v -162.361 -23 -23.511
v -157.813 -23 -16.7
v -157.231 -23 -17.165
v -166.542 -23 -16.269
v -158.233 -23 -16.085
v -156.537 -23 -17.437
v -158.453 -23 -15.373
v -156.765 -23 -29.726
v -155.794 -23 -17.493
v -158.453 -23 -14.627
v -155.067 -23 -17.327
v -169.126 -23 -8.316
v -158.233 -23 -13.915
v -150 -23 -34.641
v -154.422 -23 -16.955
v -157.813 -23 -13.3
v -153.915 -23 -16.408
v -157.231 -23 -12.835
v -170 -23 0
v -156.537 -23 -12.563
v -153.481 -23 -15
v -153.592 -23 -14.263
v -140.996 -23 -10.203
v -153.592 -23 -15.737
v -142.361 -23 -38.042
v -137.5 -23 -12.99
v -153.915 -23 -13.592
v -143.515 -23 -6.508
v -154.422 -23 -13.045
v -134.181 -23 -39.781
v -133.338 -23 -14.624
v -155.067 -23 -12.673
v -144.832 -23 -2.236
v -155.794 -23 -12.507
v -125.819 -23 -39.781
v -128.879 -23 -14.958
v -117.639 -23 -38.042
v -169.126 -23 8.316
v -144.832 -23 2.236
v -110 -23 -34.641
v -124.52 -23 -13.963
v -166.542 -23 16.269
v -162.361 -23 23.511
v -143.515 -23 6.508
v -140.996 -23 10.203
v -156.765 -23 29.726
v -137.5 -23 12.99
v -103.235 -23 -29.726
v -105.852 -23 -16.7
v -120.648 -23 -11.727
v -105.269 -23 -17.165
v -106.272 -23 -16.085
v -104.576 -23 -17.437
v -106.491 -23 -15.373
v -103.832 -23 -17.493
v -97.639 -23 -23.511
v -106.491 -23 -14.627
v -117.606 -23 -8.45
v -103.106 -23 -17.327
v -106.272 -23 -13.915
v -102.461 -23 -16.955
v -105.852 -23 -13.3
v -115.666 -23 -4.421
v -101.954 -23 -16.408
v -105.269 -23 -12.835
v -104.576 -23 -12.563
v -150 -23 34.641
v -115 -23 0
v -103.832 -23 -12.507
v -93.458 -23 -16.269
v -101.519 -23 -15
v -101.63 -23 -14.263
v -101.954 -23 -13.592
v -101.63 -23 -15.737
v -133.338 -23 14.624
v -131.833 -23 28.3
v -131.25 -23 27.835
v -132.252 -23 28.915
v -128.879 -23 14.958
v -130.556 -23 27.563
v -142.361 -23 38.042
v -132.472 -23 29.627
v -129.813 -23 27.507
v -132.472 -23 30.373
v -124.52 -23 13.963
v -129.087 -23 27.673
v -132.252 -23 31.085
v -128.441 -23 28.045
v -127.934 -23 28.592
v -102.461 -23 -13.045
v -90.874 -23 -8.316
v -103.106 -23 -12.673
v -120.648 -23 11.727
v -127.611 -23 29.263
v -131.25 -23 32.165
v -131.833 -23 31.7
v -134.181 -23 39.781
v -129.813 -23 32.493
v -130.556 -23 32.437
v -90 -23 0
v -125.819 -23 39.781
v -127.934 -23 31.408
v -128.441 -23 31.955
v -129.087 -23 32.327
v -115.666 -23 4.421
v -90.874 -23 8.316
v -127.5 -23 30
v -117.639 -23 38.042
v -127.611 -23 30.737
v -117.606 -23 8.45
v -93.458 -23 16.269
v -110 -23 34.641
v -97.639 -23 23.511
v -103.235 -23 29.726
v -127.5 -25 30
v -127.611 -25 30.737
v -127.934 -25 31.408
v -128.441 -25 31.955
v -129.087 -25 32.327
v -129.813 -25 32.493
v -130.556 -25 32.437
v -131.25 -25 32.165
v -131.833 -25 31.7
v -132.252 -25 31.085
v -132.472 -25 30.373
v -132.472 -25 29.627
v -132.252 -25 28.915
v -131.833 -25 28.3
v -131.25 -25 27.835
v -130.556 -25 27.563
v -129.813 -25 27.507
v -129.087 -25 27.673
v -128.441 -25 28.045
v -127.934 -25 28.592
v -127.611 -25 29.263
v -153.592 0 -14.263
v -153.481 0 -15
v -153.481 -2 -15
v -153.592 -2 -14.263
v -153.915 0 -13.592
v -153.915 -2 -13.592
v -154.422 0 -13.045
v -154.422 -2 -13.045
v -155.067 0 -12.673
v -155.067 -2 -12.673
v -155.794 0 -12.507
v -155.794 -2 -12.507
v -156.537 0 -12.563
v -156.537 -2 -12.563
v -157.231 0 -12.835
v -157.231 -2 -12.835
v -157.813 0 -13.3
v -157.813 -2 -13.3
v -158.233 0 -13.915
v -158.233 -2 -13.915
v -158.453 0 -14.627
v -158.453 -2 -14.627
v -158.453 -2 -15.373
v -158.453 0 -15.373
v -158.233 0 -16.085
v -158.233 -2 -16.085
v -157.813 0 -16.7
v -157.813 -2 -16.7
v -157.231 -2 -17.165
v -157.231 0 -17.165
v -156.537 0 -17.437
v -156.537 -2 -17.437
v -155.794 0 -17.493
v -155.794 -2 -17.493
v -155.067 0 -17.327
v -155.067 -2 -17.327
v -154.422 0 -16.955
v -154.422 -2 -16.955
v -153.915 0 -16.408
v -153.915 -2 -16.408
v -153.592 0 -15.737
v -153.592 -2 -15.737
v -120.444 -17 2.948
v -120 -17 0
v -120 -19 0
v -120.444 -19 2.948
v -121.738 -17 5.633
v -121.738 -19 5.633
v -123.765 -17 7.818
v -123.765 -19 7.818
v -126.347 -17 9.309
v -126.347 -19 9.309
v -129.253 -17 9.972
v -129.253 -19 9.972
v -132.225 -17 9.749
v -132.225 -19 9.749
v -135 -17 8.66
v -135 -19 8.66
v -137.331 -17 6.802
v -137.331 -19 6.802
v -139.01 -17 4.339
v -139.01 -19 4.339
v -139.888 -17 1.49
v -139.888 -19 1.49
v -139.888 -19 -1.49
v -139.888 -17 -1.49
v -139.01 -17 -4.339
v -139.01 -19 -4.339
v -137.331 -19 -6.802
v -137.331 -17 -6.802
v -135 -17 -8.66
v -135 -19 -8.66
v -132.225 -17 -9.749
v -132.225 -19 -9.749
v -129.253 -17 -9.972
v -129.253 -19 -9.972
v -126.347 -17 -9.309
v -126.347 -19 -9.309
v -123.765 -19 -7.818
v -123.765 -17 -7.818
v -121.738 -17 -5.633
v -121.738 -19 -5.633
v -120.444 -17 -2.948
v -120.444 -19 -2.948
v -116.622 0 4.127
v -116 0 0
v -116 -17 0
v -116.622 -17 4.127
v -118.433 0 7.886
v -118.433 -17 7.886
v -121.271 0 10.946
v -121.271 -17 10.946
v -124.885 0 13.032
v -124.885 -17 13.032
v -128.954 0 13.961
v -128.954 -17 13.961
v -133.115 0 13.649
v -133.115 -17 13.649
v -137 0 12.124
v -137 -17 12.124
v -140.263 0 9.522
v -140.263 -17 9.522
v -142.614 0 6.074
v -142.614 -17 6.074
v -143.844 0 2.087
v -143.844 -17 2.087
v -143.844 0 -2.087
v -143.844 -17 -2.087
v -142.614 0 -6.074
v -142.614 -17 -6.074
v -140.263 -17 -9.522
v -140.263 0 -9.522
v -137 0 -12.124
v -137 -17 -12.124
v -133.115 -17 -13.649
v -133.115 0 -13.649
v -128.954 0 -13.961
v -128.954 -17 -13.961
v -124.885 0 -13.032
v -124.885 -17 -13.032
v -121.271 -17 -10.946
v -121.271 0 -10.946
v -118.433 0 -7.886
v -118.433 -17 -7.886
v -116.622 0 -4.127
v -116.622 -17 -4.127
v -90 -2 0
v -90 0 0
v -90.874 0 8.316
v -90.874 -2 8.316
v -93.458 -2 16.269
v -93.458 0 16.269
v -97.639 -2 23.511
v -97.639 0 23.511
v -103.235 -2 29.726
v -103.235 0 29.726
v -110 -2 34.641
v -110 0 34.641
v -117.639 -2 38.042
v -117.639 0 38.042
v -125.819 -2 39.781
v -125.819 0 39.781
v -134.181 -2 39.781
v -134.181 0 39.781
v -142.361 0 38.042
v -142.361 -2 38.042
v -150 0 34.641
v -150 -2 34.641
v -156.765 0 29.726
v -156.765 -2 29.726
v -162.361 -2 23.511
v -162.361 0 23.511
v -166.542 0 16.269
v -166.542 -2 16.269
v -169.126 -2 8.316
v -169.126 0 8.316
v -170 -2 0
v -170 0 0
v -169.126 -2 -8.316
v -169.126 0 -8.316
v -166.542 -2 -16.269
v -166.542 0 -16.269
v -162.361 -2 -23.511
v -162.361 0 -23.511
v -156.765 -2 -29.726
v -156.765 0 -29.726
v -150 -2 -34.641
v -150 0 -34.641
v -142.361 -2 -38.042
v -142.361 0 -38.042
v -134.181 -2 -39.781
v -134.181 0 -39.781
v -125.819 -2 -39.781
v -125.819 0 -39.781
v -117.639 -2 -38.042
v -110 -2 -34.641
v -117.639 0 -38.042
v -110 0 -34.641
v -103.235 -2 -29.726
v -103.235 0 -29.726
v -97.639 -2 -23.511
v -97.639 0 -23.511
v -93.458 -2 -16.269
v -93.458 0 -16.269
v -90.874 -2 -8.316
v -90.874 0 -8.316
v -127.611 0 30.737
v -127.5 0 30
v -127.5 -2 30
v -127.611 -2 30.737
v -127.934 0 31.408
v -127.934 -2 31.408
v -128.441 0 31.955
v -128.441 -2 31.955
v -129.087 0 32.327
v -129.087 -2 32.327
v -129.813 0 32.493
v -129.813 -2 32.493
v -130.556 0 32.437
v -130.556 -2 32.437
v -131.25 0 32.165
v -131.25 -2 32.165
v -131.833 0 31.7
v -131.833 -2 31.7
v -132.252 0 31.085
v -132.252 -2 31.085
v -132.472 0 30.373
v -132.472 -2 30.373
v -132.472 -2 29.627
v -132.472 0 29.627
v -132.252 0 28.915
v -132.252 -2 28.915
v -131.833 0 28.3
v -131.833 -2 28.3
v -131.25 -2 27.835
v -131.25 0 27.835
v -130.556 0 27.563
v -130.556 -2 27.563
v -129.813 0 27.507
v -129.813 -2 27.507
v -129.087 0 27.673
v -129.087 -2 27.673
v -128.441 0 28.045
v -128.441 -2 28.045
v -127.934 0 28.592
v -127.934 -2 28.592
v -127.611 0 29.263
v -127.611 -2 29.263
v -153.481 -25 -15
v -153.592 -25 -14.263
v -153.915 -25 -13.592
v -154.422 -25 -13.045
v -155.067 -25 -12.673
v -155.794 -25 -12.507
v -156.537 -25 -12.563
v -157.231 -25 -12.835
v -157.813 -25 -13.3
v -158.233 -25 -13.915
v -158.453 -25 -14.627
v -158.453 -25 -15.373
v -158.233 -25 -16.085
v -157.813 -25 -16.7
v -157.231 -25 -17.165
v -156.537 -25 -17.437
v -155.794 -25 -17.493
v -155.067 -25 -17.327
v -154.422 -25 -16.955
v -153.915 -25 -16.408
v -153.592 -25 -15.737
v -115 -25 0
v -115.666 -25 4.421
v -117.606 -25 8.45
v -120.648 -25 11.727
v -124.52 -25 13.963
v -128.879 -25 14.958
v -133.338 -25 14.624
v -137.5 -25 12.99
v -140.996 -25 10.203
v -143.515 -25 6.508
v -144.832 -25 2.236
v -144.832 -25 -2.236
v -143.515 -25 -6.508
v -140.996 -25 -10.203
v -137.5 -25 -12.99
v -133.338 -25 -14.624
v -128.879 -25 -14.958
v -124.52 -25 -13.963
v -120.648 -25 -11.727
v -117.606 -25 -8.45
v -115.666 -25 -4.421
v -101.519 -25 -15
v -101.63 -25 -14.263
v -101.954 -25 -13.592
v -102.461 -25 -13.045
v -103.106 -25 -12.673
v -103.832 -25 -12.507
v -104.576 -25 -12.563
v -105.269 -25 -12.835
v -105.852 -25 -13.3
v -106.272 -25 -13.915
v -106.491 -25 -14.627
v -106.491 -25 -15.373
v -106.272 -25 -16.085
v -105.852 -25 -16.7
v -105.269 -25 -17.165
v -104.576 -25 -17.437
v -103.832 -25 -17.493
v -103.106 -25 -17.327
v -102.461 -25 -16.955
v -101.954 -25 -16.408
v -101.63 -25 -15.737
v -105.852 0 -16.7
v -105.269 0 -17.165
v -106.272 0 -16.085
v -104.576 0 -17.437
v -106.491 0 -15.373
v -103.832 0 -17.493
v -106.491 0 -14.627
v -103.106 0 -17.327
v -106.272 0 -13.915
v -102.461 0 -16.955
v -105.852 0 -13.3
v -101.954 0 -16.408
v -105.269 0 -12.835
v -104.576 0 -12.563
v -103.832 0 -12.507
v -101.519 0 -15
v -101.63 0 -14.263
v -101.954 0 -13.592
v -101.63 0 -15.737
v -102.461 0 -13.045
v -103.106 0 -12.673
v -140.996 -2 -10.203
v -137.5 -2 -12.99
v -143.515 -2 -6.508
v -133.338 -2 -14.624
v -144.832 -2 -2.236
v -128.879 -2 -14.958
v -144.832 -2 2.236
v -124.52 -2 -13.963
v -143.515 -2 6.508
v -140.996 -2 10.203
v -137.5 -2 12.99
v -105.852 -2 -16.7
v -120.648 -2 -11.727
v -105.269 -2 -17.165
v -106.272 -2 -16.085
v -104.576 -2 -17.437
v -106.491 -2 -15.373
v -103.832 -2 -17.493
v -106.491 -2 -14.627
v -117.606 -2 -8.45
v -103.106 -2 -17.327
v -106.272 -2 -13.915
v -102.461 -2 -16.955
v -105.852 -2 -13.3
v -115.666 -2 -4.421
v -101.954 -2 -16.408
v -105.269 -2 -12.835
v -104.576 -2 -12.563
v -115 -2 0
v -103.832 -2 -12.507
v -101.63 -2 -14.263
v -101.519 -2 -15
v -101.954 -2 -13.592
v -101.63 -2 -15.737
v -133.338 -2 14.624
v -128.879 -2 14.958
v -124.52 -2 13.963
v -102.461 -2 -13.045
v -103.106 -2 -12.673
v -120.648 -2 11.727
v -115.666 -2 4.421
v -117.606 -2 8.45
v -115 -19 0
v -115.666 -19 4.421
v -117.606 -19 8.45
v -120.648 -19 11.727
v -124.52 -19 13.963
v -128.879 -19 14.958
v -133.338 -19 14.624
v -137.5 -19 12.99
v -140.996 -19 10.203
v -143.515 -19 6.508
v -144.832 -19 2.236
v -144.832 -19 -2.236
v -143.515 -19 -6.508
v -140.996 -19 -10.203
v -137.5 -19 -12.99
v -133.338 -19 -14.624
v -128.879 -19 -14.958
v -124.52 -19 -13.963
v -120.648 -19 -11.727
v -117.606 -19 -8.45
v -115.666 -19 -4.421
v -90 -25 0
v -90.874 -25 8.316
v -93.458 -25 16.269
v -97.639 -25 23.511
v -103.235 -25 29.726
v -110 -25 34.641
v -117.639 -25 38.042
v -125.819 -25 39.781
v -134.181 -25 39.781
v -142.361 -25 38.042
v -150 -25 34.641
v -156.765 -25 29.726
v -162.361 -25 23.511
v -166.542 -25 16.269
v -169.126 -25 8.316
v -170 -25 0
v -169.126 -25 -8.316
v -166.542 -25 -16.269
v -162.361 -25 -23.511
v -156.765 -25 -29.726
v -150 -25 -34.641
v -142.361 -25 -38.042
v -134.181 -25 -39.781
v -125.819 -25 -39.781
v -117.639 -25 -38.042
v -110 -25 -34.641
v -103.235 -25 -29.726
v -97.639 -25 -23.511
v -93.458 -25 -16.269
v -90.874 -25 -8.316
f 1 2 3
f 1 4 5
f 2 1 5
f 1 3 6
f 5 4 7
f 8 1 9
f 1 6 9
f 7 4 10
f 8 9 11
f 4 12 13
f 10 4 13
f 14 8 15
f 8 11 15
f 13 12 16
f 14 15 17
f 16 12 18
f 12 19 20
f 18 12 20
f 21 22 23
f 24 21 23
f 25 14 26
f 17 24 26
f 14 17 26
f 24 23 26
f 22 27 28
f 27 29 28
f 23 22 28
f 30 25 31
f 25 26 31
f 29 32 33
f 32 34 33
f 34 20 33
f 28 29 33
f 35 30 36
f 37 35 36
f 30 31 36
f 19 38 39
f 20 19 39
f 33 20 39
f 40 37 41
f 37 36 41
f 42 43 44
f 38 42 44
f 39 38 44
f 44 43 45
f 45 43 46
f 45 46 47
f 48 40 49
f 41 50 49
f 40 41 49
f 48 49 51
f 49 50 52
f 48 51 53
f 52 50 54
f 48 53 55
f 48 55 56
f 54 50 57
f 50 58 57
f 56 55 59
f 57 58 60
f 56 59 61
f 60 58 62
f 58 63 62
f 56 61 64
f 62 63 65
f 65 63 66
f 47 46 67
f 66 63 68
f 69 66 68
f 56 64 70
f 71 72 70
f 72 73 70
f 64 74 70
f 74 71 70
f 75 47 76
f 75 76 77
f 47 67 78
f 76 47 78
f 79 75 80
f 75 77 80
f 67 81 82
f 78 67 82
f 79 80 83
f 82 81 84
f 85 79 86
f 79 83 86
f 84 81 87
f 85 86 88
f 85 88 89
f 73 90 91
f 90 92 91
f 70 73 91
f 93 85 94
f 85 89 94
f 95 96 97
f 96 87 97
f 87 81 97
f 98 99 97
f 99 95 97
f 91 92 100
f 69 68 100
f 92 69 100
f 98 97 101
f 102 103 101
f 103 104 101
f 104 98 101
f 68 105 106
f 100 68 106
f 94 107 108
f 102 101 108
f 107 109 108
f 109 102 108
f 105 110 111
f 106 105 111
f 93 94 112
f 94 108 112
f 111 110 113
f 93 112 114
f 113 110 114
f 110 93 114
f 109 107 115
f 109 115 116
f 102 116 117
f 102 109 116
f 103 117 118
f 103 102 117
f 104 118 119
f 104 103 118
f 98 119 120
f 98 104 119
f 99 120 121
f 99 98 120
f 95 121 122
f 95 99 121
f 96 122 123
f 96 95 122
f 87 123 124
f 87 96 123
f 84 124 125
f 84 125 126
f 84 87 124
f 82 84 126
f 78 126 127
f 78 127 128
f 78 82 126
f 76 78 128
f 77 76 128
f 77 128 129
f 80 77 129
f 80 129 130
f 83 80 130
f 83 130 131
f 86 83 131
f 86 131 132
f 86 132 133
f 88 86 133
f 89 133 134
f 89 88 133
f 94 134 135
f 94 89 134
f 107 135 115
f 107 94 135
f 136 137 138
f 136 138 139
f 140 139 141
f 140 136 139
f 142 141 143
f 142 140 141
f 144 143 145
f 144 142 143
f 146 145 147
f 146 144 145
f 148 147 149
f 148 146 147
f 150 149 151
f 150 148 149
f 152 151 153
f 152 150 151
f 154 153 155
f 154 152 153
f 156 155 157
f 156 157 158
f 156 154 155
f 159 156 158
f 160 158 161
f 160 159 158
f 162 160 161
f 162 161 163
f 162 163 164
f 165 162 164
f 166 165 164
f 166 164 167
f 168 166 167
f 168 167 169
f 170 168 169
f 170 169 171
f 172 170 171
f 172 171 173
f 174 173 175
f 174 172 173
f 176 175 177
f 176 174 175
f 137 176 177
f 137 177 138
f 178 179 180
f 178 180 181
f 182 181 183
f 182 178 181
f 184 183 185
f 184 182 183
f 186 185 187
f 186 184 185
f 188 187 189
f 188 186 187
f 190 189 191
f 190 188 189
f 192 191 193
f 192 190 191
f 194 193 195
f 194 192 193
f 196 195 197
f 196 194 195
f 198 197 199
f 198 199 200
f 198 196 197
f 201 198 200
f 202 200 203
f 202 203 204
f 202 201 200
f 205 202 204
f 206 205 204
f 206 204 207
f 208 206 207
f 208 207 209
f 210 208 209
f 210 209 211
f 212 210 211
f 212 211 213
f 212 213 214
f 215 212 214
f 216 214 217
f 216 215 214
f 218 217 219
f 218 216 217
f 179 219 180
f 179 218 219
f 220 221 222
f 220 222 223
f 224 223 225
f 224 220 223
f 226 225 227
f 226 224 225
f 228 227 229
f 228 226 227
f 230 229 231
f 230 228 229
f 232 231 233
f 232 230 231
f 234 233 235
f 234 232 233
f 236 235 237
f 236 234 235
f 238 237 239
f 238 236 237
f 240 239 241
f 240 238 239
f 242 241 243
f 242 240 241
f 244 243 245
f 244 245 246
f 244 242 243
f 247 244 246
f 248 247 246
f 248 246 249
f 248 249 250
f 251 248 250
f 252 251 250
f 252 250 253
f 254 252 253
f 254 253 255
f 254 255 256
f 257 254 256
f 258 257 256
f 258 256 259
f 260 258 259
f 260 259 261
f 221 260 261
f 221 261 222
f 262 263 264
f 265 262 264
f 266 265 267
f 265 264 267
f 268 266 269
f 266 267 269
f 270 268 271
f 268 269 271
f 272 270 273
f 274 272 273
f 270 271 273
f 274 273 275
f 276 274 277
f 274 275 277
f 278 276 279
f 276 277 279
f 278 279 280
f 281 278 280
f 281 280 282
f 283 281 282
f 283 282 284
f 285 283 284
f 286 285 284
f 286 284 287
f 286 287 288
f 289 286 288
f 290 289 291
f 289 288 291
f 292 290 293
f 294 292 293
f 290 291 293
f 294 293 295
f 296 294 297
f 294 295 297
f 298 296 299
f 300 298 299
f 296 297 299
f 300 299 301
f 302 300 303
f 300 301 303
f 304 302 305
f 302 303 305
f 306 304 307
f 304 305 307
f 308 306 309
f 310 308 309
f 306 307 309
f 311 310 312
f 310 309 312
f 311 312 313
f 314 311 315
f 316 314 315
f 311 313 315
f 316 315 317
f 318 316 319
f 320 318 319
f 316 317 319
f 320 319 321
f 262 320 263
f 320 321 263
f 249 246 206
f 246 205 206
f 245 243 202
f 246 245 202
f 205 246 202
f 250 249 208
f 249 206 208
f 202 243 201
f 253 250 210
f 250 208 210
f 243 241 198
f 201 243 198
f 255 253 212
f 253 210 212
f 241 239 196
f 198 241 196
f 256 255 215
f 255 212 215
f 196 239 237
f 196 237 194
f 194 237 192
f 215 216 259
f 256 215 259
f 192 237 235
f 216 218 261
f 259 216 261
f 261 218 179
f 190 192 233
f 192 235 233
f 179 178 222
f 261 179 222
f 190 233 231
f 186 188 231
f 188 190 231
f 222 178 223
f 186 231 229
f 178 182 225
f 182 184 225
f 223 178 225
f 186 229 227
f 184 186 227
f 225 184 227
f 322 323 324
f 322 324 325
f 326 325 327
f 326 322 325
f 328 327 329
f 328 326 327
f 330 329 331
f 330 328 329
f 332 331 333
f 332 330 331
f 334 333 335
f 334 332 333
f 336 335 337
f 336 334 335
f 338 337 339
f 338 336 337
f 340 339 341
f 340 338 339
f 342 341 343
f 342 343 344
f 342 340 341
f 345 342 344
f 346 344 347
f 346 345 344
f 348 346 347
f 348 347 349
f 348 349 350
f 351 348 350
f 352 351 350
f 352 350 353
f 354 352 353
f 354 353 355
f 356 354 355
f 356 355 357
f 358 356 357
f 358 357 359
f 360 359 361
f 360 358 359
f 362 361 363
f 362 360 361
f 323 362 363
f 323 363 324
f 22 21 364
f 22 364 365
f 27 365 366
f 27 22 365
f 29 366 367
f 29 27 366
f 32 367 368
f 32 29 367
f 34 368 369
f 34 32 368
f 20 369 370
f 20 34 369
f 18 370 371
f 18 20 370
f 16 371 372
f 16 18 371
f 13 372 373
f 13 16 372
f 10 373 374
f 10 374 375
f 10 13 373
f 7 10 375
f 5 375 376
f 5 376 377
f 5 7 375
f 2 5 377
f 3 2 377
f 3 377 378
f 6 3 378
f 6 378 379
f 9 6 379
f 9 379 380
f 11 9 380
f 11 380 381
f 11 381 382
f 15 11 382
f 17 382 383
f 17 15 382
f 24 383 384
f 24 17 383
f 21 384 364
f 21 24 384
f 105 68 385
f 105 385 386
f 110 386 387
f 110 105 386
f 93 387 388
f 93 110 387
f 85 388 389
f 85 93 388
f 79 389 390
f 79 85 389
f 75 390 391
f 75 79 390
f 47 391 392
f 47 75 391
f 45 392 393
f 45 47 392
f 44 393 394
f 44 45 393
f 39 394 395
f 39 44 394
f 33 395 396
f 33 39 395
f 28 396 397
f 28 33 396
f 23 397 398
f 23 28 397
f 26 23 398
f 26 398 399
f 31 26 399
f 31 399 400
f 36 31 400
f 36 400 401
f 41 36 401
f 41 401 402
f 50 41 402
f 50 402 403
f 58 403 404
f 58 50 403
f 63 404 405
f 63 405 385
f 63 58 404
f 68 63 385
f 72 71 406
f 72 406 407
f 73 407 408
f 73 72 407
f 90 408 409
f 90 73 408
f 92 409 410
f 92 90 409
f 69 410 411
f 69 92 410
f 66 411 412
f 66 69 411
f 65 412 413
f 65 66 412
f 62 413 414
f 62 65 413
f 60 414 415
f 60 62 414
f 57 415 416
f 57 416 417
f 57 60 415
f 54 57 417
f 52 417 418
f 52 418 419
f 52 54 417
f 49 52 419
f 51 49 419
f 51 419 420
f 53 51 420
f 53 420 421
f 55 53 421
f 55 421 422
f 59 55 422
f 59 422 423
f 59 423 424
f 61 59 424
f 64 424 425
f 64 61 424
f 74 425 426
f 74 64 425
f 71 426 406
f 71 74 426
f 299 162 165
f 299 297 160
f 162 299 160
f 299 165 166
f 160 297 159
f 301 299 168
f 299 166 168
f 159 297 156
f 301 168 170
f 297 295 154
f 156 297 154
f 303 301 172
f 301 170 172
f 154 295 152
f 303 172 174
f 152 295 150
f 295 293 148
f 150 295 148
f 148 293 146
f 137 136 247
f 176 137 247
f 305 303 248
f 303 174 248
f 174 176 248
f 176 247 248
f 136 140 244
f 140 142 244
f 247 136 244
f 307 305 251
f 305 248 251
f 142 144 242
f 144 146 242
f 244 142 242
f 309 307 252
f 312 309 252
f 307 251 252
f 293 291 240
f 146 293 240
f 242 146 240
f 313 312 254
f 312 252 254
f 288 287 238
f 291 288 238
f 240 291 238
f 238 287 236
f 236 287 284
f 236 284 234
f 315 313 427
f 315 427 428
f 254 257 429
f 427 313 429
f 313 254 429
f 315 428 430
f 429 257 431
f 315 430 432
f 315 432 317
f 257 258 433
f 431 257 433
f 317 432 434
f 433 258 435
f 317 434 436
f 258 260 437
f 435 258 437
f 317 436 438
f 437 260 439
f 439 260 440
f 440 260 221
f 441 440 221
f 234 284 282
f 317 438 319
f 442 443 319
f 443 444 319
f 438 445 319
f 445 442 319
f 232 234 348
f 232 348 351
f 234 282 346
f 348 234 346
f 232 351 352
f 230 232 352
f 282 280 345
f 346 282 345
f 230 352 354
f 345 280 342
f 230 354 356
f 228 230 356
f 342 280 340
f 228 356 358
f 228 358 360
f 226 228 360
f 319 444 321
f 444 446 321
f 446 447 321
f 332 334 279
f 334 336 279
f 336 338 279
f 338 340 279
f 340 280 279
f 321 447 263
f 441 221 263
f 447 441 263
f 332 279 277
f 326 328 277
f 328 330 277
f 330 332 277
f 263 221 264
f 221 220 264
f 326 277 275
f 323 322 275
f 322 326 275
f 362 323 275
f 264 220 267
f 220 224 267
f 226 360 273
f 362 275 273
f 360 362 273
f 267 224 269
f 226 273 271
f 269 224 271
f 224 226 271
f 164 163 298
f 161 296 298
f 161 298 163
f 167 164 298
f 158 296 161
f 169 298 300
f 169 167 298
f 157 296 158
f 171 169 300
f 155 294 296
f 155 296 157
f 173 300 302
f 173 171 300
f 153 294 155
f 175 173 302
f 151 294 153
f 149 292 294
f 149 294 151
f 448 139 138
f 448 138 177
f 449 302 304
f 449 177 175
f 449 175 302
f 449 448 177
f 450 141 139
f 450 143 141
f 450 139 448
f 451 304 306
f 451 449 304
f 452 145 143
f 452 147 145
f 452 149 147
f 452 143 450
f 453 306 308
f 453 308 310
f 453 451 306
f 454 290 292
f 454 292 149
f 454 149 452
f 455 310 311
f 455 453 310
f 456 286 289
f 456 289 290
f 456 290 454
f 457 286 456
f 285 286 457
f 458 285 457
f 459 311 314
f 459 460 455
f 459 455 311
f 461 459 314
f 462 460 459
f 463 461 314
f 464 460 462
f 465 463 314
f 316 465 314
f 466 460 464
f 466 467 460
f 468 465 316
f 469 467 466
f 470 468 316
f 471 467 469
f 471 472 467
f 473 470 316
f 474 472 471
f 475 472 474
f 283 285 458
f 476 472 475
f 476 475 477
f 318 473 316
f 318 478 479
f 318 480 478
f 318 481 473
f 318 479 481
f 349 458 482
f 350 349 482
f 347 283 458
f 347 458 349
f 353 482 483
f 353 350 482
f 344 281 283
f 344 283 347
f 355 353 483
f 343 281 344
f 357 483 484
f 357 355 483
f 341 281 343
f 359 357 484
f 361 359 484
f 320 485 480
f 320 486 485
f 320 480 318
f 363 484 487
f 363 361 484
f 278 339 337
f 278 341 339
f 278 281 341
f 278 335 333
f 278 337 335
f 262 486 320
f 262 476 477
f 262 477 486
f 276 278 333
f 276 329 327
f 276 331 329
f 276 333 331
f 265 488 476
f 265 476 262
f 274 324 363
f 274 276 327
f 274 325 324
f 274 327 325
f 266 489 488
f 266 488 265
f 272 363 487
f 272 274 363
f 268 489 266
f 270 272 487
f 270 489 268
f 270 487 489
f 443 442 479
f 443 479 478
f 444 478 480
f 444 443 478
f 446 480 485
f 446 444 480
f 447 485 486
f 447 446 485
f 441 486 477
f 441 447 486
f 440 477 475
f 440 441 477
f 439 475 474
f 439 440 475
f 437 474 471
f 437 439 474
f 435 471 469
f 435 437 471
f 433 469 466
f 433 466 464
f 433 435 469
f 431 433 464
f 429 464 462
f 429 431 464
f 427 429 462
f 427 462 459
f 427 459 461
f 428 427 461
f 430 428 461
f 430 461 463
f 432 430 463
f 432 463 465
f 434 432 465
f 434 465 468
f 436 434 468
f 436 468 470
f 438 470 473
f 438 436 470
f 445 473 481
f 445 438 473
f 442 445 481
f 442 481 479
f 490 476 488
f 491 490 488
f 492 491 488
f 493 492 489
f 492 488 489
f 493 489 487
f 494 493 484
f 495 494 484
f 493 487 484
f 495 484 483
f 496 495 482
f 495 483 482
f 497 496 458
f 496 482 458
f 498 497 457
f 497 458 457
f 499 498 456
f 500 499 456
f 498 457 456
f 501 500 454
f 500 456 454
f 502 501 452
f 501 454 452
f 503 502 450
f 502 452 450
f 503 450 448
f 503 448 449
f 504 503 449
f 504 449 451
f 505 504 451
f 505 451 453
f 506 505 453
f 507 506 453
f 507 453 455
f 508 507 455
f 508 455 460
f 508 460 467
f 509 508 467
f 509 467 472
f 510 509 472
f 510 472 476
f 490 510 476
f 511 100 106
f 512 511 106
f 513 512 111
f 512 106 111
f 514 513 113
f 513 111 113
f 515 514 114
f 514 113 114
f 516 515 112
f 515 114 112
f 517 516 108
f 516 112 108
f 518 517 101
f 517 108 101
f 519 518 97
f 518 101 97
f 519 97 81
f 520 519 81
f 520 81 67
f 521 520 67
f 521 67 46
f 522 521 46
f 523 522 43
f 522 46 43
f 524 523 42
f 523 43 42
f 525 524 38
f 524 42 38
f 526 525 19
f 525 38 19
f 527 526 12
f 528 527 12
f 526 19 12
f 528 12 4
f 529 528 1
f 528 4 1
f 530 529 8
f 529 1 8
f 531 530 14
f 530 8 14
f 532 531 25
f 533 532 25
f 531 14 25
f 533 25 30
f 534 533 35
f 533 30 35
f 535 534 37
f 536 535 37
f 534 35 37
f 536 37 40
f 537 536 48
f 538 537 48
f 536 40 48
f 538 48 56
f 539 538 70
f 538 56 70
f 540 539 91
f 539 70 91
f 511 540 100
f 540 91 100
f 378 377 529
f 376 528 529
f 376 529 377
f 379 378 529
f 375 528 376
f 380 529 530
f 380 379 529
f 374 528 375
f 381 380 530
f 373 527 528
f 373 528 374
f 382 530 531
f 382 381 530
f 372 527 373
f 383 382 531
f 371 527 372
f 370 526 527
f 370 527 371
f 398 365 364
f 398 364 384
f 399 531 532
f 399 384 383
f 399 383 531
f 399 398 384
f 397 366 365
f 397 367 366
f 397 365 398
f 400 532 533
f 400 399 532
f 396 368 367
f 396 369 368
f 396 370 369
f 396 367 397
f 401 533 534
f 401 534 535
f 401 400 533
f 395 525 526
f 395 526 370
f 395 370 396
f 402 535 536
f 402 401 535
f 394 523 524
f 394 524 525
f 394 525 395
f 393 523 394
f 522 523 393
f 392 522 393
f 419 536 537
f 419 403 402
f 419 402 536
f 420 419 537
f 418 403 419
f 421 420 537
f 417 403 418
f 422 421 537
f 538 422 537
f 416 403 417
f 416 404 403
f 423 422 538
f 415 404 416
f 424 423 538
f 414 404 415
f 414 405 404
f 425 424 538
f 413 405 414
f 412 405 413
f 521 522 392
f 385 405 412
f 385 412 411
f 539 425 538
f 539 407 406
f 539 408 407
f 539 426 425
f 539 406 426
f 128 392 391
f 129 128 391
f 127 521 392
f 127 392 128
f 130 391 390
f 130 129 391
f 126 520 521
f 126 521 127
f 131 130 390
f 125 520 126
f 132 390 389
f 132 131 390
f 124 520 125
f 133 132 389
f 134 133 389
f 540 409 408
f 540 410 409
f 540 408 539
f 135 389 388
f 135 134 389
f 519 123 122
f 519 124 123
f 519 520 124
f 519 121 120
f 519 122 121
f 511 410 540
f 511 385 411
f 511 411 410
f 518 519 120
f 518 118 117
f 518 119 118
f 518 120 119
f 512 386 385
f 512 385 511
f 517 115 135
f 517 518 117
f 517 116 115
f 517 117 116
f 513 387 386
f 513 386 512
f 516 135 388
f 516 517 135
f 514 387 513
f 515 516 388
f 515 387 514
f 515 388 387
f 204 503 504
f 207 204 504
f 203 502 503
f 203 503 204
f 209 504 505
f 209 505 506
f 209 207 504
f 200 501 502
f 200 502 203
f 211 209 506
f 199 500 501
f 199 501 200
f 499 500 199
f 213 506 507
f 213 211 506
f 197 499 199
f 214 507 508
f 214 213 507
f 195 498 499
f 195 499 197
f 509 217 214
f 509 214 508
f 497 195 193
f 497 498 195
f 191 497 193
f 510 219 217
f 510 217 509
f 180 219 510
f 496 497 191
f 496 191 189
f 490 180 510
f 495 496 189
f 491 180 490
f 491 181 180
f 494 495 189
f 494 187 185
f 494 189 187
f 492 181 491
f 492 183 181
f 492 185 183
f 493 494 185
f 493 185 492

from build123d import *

# Parameters (mm, degrees)
F0_R     = 40
F0_R_2   = 2.5
F0_R_3   = 15
F1_DEPTH = 2
F0_R_4   = 14
F2_DEPTH = 19
F3_START = 17
F0_R_5   = 10
F3_DEPTH = 2
F4_START = 23
F4_DEPTH = 2


with BuildPart() as f1:
    # F0 (on Front) → F1 (new body)
    with BuildSketch(Plane.XZ):
        with Locations((-130, 0)):
            Circle(F0_R)
        with Locations((-155.9807621135, -15)):
            Circle(F0_R_2, mode=Mode.SUBTRACT)
        with Locations((-104.0192378865, -15)):
            Circle(F0_R_2, mode=Mode.SUBTRACT)
        with Locations((-130, 0)):
            Circle(F0_R_3, mode=Mode.SUBTRACT)
        with Locations((-130, 30)):
            Circle(F0_R_2, mode=Mode.SUBTRACT)
    extrude(amount=F1_DEPTH)

    # F0 (on Front) → F2 (join)
    with BuildSketch(Plane.XZ):
        with Locations((-130, 0)):
            Circle(F0_R_3)
        with Locations((-130, 0)):
            Circle(F0_R_4, mode=Mode.SUBTRACT)
    extrude(amount=F2_DEPTH)

    # F0 (on Front) → F3 (join)
    with BuildSketch(Plane.XZ.offset(F3_START)):
        with Locations((-130, 0)):
            Circle(F0_R_4)
        with Locations((-130, 0)):
            Circle(F0_R_5, mode=Mode.SUBTRACT)
    extrude(amount=F3_DEPTH)


with BuildPart() as f4:
    # F0 (on Front) → F4 (new body)
    with BuildSketch(Plane.XZ.offset(F4_START)):
        with Locations((-130, 0)):
            Circle(F0_R)
        with Locations((-155.9807621135, -15)):
            Circle(F0_R_2, mode=Mode.SUBTRACT)
        with Locations((-104.0192378865, -15)):
            Circle(F0_R_2, mode=Mode.SUBTRACT)
        with Locations((-130, 0)):
            Circle(F0_R_3, mode=Mode.SUBTRACT)
        with Locations((-130, 30)):
            Circle(F0_R_2, mode=Mode.SUBTRACT)
    extrude(amount=F4_DEPTH)


solid = Compound([f1.part, f4.part])
